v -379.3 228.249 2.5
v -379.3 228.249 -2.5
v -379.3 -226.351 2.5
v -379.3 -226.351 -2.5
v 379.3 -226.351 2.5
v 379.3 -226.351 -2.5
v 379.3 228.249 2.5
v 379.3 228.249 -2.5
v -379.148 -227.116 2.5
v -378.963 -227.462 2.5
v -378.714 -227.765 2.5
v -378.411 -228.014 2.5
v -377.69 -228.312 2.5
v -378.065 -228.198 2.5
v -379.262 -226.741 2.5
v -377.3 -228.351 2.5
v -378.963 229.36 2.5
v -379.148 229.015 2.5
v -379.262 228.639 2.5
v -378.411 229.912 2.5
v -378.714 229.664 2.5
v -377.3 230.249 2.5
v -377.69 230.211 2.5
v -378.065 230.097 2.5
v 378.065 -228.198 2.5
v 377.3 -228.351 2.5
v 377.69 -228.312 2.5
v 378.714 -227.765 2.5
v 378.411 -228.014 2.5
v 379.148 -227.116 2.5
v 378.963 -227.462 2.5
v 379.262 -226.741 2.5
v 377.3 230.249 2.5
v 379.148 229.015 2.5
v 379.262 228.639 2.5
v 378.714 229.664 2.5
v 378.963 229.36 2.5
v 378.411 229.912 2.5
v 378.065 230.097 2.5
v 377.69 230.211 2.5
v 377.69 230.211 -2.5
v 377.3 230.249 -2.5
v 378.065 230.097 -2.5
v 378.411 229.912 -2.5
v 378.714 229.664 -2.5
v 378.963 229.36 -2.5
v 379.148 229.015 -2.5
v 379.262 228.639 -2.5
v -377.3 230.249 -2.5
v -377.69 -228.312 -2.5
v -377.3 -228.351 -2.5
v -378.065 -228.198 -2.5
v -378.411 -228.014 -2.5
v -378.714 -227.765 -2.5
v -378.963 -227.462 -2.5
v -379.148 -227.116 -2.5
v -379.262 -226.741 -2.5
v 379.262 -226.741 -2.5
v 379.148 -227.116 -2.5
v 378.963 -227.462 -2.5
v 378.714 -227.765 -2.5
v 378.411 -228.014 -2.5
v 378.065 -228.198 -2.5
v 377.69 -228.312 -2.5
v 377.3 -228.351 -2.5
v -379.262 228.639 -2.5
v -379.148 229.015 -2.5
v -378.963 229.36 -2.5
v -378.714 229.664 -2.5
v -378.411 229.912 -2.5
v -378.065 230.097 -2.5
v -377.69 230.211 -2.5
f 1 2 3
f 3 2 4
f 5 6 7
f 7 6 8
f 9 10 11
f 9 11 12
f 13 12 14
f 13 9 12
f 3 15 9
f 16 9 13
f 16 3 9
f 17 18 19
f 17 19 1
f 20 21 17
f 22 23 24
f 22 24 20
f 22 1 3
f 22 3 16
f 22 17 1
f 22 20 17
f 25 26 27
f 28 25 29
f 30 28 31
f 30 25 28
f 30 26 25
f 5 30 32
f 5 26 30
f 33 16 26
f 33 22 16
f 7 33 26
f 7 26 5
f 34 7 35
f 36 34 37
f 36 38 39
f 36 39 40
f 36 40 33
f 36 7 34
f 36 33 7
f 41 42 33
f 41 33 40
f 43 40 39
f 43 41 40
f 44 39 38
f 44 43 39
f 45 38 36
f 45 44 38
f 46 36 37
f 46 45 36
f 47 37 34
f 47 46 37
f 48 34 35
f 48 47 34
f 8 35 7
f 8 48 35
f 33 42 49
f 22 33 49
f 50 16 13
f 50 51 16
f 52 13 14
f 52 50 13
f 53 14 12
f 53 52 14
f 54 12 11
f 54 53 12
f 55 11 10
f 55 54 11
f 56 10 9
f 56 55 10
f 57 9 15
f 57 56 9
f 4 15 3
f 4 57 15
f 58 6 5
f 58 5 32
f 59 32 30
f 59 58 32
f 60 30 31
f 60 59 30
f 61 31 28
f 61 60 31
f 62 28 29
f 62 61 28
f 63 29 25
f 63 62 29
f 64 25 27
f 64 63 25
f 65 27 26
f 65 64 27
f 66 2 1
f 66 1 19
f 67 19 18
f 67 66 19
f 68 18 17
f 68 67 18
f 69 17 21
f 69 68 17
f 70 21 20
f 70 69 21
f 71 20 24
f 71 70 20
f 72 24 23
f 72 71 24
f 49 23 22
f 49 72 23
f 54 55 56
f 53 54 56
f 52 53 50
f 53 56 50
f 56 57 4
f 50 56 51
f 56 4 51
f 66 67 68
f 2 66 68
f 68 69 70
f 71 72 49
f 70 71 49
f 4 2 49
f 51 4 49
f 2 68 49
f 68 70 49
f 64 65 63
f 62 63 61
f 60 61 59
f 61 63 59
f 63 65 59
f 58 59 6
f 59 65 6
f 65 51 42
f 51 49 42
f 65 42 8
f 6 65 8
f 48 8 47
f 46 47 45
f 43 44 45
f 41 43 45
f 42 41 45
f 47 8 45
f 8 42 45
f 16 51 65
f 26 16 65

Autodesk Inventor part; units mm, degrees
ref_plane "YZ Plane" through (0, 0, 0) normal (1, 0, 0) x (0, 1, 0)
ref_plane "XZ Plane" through (0, 0, 0) normal (0, 1, 0) x (-1, 0, 0)
ref_plane "XY Plane" through (0, 0, 0) normal (0, 0, 1) x (1, 0, 0)
sketch "Sketch1" plane through (0, 0, 0) normal (0, 0, 1) x (1, 0, 0)
  line L0 (379.3, -228.3507) -> (379.3, 230.2493) construction
  line L1 (-379.3, 230.2493) -> (-379.3, -228.3507) construction
  line L2 (379.3, 230.2493) -> (-379.3, 230.2493) construction
  line L3 (379.3, -228.3507) -> (-379.3, -228.3507) construction
  line L4 (377.3, 230.2493) -> (-377.3, 230.2493)
  line L5 (-379.3, 228.2493) -> (-379.3, -226.3507)
  line L6 (-377.3, -228.3507) -> (377.3, -228.3507)
  line L7 (379.3, -226.3507) -> (379.3, 228.2493)
  arc A0 (377.3, -228.3507) -> (379.3, -226.3507) centre (377.3, -226.3507) ccw
  arc A1 (379.3, 228.2493) -> (377.3, 230.2493) centre (377.3, 228.2493) ccw
  arc A2 (-377.3, 230.2493) -> (-379.3, 228.2493) centre (-377.3, 228.2493) ccw
  arc A3 (-379.3, -226.3507) -> (-377.3, -228.3507) centre (-377.3, -226.3507) ccw
  point P0 (0, 0)
  dimension "d0" = 2
extrude "Extrusion1" add sketch "Sketch1" along normal mid plane 5
properties part number "Cover_LiftSurface" material "Steel, Galvanized"
